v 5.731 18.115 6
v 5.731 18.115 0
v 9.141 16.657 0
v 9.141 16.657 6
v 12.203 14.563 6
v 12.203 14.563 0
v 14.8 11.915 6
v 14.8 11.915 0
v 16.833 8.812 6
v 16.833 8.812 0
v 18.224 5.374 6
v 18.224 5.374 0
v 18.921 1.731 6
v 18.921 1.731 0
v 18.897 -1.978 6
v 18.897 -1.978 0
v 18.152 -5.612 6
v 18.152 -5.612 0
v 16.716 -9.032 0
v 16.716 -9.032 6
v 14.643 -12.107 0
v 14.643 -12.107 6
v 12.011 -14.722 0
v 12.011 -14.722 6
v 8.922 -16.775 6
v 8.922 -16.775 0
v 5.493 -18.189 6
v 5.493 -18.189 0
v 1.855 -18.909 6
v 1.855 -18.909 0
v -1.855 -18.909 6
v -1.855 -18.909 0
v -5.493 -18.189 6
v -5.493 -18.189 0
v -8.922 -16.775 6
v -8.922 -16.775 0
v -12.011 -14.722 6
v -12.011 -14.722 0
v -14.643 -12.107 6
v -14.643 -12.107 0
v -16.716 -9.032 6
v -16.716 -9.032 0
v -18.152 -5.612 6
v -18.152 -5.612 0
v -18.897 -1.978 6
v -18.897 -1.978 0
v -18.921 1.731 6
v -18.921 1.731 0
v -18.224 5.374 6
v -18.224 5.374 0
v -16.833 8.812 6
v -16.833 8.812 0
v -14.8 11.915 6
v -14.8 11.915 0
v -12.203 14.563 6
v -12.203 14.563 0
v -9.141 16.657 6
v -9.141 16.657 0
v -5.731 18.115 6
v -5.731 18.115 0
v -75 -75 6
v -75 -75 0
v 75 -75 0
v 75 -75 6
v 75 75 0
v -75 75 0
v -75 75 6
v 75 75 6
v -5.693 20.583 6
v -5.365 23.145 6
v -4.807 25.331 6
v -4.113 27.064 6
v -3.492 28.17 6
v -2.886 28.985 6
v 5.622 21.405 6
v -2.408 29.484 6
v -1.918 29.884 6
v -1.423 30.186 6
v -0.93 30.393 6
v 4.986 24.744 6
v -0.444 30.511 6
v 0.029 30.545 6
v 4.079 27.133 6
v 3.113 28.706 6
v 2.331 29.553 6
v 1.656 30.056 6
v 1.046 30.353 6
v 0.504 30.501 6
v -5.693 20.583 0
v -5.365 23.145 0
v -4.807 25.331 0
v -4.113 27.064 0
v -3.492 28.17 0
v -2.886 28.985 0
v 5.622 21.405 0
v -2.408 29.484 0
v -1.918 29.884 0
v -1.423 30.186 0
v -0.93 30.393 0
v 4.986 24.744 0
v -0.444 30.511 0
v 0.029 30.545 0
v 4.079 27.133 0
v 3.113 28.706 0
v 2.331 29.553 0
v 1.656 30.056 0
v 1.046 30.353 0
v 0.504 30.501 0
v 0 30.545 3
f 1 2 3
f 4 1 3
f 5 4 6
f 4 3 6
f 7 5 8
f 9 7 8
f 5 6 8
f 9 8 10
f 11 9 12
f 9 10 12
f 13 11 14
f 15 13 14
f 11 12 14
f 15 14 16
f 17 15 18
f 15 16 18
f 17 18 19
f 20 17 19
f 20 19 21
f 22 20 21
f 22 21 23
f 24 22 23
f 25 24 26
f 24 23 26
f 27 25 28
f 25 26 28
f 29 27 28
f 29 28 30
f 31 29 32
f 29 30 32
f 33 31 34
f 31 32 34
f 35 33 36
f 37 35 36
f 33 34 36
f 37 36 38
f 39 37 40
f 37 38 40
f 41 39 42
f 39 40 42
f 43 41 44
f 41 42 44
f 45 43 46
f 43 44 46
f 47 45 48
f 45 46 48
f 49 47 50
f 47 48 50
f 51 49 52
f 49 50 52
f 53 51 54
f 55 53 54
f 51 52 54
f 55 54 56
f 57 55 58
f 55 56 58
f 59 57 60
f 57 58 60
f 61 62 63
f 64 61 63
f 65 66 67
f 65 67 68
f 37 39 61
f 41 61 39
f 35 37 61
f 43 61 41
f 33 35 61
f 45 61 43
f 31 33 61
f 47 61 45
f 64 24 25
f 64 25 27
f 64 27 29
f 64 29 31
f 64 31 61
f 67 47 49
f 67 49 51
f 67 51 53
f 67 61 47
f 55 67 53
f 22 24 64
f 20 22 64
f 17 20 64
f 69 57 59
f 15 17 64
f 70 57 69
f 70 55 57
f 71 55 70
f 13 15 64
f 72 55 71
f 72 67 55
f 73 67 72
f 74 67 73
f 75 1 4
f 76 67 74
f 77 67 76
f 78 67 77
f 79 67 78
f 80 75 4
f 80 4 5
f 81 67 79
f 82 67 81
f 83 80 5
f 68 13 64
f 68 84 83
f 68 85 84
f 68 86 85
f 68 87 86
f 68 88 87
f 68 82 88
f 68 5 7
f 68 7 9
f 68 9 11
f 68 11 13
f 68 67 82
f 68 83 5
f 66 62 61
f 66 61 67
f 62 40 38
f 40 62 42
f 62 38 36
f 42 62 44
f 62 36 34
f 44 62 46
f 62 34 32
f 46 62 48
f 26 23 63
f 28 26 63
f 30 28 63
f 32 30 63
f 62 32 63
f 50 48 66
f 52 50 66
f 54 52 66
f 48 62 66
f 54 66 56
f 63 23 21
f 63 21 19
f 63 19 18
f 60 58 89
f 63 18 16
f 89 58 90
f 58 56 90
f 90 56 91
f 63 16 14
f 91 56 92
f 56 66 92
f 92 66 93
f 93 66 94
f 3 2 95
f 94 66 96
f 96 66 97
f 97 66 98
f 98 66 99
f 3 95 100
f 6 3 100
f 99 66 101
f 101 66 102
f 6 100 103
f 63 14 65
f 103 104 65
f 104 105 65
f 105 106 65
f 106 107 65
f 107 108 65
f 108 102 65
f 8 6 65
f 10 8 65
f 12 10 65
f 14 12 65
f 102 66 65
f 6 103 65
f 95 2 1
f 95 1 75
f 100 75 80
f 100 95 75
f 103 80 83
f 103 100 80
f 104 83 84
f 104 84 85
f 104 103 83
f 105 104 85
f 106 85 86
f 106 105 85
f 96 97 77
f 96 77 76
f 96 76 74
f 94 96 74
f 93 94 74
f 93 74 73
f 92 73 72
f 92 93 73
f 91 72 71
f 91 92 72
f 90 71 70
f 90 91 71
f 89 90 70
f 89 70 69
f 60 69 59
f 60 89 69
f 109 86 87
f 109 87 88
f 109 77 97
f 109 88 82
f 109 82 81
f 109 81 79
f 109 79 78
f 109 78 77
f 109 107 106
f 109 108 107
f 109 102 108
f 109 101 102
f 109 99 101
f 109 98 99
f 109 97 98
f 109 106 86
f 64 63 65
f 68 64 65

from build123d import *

# Parameters (mm, degrees)
F0_W     = 150
F0_H     = 150
F1_DEPTH = 6


with BuildPart() as f1:
    # F0 (on Top) → F1 (new body)
    with BuildSketch(Plane.XY):
        Rectangle(F0_W, F0_H)
        with BuildLine():
            ThreePointArc((5.7307365463, 18.1151499756), (0, -19), (-5.7307365463, 18.1151499756))
            add(Edge.make_bspline(
                [(5.7307365463, 18.1151499756), (6.2063982555, 30.545456659), (0, 30.545456659), (-6.2063982555, 30.545456659), (-5.7307365463, 18.1151499756)],
                knots=[4.6356732139, 4.6356732139, 4.6356732139, 6.2831853072, 6.2831853072, 7.9306974004, 7.9306974004, 7.9306974004], degree=2, weights=[1, 0.6794701836, 1, 0.6794701836, 1]))
        make_face(mode=Mode.SUBTRACT)
    extrude(amount=F1_DEPTH)


solid = f1.part
